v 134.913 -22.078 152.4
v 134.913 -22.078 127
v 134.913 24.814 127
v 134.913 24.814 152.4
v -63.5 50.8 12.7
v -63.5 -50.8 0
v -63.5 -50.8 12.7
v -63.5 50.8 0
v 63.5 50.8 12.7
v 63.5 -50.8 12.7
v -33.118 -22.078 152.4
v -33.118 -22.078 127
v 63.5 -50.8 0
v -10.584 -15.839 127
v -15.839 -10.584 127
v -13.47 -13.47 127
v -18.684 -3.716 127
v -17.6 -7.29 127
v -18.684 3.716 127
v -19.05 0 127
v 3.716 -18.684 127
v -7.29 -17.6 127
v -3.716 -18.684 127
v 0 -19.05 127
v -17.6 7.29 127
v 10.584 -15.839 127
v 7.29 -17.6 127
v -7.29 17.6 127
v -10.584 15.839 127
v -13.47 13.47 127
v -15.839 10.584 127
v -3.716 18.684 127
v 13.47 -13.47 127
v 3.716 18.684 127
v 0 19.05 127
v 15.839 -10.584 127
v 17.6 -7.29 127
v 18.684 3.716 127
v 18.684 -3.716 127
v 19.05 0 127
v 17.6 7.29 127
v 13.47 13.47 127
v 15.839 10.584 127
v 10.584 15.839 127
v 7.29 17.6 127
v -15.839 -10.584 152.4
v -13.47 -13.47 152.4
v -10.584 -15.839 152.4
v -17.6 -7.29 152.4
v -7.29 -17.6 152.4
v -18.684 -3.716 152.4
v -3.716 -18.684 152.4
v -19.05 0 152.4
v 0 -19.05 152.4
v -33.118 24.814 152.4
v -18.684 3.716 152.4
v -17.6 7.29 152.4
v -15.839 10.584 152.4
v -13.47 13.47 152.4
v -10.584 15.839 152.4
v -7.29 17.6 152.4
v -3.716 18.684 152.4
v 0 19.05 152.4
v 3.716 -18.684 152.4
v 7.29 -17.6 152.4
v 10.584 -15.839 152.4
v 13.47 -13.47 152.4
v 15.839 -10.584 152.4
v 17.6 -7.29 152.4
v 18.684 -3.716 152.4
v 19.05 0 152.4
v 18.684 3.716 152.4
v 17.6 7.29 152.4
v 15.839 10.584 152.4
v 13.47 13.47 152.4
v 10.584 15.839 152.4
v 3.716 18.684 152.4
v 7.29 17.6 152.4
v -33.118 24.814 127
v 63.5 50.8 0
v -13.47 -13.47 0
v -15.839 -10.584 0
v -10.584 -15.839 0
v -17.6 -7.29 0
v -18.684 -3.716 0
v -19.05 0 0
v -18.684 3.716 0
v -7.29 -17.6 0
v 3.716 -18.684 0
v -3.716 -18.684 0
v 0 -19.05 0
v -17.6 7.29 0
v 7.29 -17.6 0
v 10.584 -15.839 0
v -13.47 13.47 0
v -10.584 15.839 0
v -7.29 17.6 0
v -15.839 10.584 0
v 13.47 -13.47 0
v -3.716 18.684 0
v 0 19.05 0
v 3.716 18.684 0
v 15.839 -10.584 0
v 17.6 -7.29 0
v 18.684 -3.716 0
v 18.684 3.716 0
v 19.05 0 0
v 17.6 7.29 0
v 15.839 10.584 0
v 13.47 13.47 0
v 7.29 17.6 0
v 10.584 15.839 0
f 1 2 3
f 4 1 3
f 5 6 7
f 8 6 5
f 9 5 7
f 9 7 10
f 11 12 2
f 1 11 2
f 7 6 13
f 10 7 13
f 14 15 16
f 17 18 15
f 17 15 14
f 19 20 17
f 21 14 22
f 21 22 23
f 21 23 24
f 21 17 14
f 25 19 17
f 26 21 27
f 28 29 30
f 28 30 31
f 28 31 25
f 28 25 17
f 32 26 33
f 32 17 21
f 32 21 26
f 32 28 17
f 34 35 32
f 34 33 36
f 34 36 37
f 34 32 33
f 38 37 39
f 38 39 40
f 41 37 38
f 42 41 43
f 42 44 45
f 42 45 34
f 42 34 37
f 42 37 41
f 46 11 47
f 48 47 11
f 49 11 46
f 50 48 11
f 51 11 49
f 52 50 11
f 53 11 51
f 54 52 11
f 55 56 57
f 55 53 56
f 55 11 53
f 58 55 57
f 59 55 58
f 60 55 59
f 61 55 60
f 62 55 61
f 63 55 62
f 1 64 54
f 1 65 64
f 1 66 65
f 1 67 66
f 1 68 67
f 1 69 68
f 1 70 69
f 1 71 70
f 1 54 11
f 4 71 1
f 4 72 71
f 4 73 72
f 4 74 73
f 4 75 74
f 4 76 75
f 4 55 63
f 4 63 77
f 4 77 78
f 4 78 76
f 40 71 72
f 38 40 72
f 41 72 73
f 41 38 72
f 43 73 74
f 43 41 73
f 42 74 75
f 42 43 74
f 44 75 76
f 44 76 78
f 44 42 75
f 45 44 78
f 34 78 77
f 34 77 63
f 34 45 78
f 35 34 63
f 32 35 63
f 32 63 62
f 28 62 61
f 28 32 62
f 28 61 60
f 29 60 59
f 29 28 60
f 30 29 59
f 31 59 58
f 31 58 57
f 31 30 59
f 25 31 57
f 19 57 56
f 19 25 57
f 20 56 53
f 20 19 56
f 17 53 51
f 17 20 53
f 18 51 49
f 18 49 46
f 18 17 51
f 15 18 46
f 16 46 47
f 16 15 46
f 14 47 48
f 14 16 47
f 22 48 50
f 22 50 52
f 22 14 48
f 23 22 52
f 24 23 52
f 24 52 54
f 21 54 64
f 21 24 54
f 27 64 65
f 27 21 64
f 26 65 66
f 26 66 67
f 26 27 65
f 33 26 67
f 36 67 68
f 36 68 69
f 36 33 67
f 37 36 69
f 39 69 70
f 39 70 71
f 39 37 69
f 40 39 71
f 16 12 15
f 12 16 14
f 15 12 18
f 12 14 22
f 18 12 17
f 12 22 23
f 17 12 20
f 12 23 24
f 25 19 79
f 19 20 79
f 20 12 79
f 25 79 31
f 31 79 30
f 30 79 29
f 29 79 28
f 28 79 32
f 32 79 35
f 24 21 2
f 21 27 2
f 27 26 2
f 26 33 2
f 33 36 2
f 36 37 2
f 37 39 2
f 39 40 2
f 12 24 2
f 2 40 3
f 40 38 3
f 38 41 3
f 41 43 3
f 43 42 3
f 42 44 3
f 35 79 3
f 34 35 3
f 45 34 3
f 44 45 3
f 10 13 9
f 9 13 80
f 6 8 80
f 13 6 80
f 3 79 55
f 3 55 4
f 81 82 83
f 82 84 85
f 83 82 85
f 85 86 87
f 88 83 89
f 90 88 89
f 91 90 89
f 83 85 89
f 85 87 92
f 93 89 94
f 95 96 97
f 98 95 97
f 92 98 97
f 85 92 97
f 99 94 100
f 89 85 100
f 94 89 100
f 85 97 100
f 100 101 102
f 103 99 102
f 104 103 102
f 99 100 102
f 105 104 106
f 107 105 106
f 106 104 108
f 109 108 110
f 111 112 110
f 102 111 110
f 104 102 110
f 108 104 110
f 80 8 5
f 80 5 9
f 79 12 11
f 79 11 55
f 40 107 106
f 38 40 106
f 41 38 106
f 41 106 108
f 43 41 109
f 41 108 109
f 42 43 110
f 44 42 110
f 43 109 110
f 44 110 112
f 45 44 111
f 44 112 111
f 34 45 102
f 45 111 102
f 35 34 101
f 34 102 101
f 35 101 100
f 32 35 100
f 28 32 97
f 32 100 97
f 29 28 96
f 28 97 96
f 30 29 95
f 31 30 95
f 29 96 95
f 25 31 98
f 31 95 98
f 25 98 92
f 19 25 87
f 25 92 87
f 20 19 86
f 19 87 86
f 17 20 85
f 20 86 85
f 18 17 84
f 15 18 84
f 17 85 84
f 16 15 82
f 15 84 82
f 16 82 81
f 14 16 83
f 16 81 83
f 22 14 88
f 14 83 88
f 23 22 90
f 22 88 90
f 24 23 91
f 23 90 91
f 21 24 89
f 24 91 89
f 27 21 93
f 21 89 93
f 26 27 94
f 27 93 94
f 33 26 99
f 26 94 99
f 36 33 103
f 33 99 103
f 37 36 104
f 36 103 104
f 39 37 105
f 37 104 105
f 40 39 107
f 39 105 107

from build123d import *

# Parameters (mm, degrees)
F0_W     = 127
F0_H     = 101.6
F1_DEPTH = 12.7
F2_R     = 19.05
F3_DEPTH = 127
F4_W     = 168.030765
F4_H     = 46.892312
F4_R     = 19.05
F5_DEPTH = 25.4


with BuildPart() as f1:
    # F0 (on Top) → F1 (new body)
    with BuildSketch(Plane.XY):
        Rectangle(F0_W, F0_H)
    extrude(amount=F1_DEPTH)


with BuildPart() as f3:
    # F2 (on Top) → F3 (new body)
    with BuildSketch(Plane.XY):
        Circle(F2_R)
    extrude(amount=F3_DEPTH)


with BuildPart() as f5:
    # F4 (on face) → F5 (new body)
    with BuildSketch(Plane.XY.offset(127)):
        with Locations((50.897689, 1.367692)):
            Rectangle(F4_W, F4_H)
        Circle(F4_R, mode=Mode.SUBTRACT)
    extrude(amount=F5_DEPTH)


solid = Compound([f1.part, f3.part, f5.part])
